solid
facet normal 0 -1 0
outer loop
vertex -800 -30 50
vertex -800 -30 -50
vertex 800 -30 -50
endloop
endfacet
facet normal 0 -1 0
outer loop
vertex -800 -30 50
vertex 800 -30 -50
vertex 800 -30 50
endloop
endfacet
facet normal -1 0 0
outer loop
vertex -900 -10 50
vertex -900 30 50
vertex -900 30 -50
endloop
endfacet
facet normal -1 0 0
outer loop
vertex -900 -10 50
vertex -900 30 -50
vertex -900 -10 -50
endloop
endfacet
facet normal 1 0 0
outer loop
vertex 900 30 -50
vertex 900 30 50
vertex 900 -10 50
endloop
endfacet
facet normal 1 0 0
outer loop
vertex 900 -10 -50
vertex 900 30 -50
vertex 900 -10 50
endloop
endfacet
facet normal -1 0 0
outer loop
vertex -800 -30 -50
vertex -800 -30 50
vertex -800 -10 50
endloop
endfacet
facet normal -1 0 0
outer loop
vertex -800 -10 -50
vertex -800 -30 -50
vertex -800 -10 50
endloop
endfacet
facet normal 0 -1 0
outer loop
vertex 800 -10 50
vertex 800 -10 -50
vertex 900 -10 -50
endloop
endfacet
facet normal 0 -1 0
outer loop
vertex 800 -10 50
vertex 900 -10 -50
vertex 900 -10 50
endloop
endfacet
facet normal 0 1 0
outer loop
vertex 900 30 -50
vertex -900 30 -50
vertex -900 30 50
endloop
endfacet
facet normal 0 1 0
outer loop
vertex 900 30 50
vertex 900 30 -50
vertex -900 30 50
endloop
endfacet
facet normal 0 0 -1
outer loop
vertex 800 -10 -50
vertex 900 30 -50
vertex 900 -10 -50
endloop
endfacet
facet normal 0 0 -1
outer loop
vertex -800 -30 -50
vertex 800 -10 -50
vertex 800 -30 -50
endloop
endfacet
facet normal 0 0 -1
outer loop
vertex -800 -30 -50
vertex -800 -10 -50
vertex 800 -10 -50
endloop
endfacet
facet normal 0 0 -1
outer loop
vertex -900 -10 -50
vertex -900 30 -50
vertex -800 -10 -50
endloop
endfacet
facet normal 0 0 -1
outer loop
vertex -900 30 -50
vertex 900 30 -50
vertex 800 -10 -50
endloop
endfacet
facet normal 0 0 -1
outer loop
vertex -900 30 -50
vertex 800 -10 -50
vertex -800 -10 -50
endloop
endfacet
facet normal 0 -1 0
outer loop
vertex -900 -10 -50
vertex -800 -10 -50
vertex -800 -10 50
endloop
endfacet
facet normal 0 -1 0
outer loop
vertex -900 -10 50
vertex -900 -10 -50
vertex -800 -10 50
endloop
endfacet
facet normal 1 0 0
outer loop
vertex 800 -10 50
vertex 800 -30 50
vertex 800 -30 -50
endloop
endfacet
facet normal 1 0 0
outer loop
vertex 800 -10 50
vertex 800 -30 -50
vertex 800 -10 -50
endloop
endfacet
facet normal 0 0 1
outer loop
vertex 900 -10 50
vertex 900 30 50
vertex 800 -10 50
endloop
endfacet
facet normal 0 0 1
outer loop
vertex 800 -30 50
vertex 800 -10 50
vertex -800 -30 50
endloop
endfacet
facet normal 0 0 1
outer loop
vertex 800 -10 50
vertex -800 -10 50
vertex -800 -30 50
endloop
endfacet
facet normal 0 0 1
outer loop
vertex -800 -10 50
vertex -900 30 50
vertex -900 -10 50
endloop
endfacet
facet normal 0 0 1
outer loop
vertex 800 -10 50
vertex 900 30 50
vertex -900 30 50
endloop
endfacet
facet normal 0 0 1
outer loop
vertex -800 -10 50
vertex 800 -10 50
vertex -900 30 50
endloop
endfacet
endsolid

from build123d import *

# Parameters (mm, degrees)
F1_W     = 60
F1_H     = 100
F2_DEPTH = 800
F3_W     = 40
F3_H     = 100
F4_DEPTH = 100


# Not quite as in the source:
# - a pattern or mirror of a feature is missing from the dataset's text; its kind, count and spacing are read off the source's solid


with BuildPart() as f2:
    # F1 (on Right) → F2 (new body, symmetric)
    with BuildSketch(Plane.YZ):
        Rectangle(F1_W, F1_H)
    extrude(amount=F2_DEPTH, both=True)

    # F3 (on face) → F4 (join)
    with BuildSketch(Plane(origin=(-800, 0, 0), x_dir=(0, -1, 0), z_dir=(-1, 0, 0))):
        with Locations((-10, 0)):
            Rectangle(F3_W, F3_H)
    f4 = extrude(amount=F4_DEPTH)

    # F4_copies: F4 across plane
    add(f4.mirror(Plane(origin=(0, 0, 0), x_dir=(0, 0, 1), z_dir=(1, 0, 0))))


solid = f2.part
